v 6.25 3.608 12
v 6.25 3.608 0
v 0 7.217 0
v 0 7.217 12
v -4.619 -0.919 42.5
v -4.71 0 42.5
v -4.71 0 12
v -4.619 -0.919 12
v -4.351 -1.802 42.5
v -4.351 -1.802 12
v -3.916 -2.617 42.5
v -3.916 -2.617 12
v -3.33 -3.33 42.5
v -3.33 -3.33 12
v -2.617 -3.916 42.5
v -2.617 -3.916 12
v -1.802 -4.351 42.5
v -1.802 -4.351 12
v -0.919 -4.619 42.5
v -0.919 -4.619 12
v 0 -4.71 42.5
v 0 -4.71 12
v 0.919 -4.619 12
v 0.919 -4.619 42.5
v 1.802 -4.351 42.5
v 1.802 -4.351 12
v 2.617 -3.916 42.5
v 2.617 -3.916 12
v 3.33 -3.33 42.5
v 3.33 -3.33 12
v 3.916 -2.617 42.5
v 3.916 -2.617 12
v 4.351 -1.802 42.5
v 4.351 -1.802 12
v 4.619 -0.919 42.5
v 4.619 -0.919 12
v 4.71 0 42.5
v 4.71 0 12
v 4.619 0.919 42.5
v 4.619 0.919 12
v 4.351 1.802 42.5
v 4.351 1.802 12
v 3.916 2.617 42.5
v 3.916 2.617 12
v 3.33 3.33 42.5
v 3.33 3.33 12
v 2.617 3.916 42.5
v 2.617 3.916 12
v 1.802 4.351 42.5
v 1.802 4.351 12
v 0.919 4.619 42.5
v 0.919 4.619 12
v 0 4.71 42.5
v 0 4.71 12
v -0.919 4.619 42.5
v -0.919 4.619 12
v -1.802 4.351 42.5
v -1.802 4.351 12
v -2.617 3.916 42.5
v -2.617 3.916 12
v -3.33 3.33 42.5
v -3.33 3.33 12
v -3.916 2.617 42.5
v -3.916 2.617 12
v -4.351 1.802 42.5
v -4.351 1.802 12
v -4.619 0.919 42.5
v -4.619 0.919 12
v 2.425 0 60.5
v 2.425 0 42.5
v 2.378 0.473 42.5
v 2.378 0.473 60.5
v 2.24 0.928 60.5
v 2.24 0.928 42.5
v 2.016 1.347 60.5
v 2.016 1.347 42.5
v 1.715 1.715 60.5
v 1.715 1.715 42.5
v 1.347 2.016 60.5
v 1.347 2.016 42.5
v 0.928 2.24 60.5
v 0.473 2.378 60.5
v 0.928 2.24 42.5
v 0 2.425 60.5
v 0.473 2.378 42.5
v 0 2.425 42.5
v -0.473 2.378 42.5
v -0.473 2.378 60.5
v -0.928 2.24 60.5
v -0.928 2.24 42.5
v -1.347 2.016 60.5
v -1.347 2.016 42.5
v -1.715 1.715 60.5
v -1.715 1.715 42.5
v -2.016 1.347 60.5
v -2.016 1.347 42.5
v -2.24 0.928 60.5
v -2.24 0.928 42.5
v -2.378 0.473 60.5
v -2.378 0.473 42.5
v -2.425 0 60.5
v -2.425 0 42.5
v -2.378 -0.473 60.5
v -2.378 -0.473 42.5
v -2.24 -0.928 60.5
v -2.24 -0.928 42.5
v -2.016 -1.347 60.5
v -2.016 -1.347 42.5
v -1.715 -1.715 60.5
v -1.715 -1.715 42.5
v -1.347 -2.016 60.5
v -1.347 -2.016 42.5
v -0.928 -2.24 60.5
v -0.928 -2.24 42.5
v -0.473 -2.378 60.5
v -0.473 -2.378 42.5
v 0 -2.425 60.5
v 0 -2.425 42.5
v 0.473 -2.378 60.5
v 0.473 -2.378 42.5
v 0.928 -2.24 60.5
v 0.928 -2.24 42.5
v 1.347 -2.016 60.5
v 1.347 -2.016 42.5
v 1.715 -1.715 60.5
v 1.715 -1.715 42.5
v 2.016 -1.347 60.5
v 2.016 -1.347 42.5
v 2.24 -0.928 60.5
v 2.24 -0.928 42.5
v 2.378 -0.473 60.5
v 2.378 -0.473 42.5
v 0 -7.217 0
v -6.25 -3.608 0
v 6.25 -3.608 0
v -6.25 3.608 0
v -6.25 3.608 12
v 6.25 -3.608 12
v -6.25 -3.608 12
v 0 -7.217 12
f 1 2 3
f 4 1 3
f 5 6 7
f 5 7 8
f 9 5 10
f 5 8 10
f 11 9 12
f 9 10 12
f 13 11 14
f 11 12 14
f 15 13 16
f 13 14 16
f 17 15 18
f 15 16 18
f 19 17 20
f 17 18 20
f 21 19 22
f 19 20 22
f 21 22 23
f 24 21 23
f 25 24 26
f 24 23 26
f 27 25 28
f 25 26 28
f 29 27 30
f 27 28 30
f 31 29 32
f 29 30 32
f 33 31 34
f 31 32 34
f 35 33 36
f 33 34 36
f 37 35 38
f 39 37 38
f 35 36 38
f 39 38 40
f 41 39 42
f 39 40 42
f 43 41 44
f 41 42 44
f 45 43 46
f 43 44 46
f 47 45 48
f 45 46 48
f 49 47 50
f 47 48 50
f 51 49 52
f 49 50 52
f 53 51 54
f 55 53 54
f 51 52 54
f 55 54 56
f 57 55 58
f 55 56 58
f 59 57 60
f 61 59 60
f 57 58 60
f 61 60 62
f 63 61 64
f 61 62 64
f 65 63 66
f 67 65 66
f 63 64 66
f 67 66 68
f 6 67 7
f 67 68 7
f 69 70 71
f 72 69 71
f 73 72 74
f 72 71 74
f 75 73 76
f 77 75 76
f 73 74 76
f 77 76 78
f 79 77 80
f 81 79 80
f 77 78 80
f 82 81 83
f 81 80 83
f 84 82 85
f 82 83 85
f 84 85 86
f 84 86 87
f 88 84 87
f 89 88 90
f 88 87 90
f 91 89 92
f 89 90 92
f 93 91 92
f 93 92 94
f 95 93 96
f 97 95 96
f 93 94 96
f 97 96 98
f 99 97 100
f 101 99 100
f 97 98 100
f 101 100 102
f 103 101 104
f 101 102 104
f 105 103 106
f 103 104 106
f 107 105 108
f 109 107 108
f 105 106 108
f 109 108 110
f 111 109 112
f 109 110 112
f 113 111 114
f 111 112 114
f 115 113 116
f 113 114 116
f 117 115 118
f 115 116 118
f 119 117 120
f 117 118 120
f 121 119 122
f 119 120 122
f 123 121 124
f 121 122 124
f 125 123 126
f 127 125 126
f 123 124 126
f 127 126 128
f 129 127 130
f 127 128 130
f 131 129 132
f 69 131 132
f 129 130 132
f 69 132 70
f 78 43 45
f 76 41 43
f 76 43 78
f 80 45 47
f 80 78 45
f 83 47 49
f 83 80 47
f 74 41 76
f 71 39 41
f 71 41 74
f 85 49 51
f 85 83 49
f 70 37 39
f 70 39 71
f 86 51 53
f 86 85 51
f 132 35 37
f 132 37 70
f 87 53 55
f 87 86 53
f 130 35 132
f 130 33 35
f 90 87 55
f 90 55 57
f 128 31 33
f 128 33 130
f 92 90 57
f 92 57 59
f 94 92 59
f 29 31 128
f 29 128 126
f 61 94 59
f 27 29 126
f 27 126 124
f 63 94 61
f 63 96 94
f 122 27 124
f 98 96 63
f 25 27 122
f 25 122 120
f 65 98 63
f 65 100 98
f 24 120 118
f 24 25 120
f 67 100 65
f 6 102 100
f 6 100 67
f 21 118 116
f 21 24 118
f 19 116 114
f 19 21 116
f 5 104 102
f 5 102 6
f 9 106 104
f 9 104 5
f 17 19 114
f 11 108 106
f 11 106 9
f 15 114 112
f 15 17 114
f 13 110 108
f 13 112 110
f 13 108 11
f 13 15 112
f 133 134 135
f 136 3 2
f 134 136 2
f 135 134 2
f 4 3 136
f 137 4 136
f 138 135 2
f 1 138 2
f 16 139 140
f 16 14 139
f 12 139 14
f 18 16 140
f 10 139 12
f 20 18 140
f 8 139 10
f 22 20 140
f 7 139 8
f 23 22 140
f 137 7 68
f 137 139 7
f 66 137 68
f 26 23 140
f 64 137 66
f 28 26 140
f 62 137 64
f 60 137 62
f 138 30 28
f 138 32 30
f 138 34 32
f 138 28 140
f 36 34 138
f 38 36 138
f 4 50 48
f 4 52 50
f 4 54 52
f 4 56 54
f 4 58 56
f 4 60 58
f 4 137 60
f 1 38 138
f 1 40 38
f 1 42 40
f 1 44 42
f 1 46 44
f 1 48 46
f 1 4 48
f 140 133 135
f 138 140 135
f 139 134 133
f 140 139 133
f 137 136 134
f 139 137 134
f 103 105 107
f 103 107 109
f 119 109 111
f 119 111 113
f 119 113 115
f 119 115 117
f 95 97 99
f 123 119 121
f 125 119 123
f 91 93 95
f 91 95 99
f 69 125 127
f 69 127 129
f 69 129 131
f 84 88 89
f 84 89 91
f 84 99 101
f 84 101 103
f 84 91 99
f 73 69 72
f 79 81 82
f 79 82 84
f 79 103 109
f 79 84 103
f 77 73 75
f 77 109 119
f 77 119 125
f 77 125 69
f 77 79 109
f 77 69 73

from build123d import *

# Parameters (mm, degrees)
SALIENTE_EXTRUIR1_DEPTH = 12
CROQUIS2_R              = 4.71
SALIENTE_EXTRUIR2_DEPTH = 30.5
CROQUIS3_R              = 2.425
SALIENTE_EXTRUIR3_DEPTH = 18


with BuildPart() as part:
    # Croquis1 → Saliente-Extruir1 (new body)
    with BuildSketch(Plane.XY):
        Polygon((0, 7.216878365), (-6.25, 3.608439182), (-6.25, -3.608439182), (0, -7.216878365), (6.25, -3.608439182), (6.25, 3.608439182), align=None)
    extrude(amount=SALIENTE_EXTRUIR1_DEPTH)

    # Croquis2 → Saliente-Extruir2 (add)
    with BuildSketch(Plane.XY.offset(12)):
        with Locations(Location((0, 0, 0), (0, 0, 180))):
            Circle(CROQUIS2_R)
    extrude(amount=SALIENTE_EXTRUIR2_DEPTH)

    # Croquis3 → Saliente-Extruir3 (add)
    with BuildSketch(Plane.XY.offset(42.5)):
        Circle(CROQUIS3_R)
    extrude(amount=SALIENTE_EXTRUIR3_DEPTH)


solid = part.part
